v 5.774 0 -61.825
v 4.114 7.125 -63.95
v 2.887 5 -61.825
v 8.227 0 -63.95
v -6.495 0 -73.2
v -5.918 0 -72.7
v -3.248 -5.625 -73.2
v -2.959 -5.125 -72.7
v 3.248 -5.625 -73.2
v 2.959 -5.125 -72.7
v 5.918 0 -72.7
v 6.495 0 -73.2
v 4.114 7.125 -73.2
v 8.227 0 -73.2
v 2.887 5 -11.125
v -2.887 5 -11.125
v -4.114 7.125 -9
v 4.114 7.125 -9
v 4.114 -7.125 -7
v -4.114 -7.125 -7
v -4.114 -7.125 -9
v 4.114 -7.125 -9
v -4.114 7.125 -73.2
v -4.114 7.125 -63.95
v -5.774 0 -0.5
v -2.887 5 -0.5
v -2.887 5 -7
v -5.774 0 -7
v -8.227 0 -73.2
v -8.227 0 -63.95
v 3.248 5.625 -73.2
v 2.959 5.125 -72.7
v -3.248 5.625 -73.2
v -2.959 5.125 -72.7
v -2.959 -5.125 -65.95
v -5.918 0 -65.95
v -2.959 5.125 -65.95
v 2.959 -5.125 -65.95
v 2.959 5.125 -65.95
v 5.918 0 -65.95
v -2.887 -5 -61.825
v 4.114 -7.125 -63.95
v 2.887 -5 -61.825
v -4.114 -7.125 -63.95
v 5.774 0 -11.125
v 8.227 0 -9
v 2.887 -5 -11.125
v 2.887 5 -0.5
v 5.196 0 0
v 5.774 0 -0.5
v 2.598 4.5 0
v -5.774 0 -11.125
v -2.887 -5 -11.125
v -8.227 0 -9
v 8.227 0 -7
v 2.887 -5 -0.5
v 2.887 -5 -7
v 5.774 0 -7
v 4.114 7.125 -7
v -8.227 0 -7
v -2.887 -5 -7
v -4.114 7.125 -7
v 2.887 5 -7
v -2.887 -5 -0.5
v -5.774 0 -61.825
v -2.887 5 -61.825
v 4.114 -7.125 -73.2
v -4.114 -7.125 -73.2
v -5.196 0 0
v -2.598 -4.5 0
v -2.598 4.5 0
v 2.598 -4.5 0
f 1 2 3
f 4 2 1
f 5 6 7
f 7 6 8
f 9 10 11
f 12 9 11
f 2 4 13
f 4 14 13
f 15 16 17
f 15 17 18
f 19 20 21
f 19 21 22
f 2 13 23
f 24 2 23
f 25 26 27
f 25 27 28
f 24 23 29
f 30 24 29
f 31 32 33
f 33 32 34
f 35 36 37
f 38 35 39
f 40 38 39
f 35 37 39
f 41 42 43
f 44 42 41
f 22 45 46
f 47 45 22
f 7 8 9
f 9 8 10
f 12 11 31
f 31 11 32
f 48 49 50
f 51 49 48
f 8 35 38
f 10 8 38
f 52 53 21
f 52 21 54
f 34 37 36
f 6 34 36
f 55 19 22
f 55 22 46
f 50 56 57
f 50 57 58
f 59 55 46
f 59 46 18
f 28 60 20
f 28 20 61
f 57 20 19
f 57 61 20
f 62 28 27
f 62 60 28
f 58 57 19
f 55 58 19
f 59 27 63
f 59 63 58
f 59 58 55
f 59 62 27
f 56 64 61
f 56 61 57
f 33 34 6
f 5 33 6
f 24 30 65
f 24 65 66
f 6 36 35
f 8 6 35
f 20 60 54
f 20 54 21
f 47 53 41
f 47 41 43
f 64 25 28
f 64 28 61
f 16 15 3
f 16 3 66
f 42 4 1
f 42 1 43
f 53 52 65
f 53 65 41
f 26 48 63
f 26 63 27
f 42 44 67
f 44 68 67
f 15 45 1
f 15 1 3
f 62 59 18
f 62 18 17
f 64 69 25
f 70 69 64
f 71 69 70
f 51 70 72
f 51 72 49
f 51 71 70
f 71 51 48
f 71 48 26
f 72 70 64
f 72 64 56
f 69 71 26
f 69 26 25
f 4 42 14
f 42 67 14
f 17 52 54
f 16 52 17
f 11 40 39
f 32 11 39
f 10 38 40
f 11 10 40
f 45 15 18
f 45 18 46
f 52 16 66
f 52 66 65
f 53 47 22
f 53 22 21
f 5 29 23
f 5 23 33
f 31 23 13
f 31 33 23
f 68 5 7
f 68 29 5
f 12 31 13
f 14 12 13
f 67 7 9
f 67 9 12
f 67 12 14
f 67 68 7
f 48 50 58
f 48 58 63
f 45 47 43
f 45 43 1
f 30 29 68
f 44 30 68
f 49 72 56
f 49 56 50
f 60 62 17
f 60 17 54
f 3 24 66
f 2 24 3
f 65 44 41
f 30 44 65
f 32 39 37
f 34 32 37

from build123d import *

# Parameters (mm, degrees)
F1_DEPTH = 65.95
F3_DEPTH = 7.25
F5_DEPTH = 2
F8_DEPTH = 2
F9_SIZE  = 0.5
F10_SIZE = 2.12499


# Not quite as in the source:
# - a fillet or chamfer is up to 0.001 mm smaller than in the source, because OpenCascade refuses the exact size


with BuildPart() as f1:
    # F0 (on Top) → F1 (new body)
    with BuildSketch(Plane.XY):
        Polygon((-2.8867513459, -5), (2.8867513459, -5), (5.7735026919, 0), (2.8867513459, 5), (-2.8867513459, 5), (-5.7735026919, 0), align=None)
    extrude(amount=-F1_DEPTH)



with BuildPart() as f3:
    # F2 (on face) → F3 (new body)
    with BuildSketch(Plane(origin=(0, 0, -65.95), x_dir=(1, 0, 0), z_dir=(0, 0, -1))):
        Polygon((4.113620668, 7.125), (-4.113620668, 7.125), (-8.227241336, 0), (-4.113620668, -7.125), (4.113620668, -7.125), (8.227241336, 0), align=None)
        Polygon((2.9589201296, 5.125), (5.9178402592, 0), (2.9589201296, -5.125), (-2.9589201296, -5.125), (-5.9178402592, 0), (-2.9589201296, 5.125), align=None, mode=Mode.SUBTRACT)
    extrude(amount=F3_DEPTH)


with BuildPart() as f1_1:
    add(f1.part)

    add(f3.part)  # F5 merges F3
    # F4 (on face) → F5 (join)
    with BuildSketch(Plane.XY.offset(-65.95)):
        Polygon((-8.227241336, 0), (-4.113620668, -7.125), (4.113620668, -7.125), (8.227241336, 0), (4.113620668, 7.125), (-4.113620668, 7.125), align=None)
    extrude(amount=F5_DEPTH)

    # F7 (on offset) → F8 (join)
    with BuildSketch(Plane.XY.offset(-7)):
        Polygon((-8.227241336, 0), (-4.113620668, -7.125), (4.113620668, -7.125), (8.227241336, 0), (4.113620668, 7.125), (-4.113620668, 7.125), align=None)
    extrude(amount=-F8_DEPTH)

    # F9
    f9_edges = [f1_1.edges().sort_by_distance(p)[0] for p in [
        (-4.330127, -2.5, 0),
        (0, -5, 0),
        (4.330127, -2.5, 0),
        (4.330127, 2.5, 0),
        (0, 5, 0),
        (-4.330127, 2.5, 0),
        (-4.43838, 2.5625, -73.2),
        (-4.43838, -2.5625, -73.2),
        (0, -5.125, -73.2),
        (4.43838, -2.5625, -73.2),
        (4.43838, 2.5625, -73.2),
        (0, 5.125, -73.2),
    ]]
    chamfer(f9_edges, length=F9_SIZE)

    # F10 (size 2.125 in the source; OpenCascade refuses exactly that, so slightly less here)
    f10_edges = [f1_1.edges().sort_by_distance(p)[0] for p in [
        (0, 5, -63.95),
        (-4.330127, 2.5, -63.95),
        (-4.330127, -2.5, -63.95),
        (0, -5, -63.95),
        (4.330127, -2.5, -63.95),
        (4.330127, 2.5, -63.95),
        (-4.330127, 2.5, -9),
        (0, 5, -9),
        (-4.330127, -2.5, -9),
        (0, -5, -9),
        (4.330127, -2.5, -9),
        (4.330127, 2.5, -9),
    ]]
    chamfer(f10_edges, length=F10_SIZE)


solid = f1_1.part
